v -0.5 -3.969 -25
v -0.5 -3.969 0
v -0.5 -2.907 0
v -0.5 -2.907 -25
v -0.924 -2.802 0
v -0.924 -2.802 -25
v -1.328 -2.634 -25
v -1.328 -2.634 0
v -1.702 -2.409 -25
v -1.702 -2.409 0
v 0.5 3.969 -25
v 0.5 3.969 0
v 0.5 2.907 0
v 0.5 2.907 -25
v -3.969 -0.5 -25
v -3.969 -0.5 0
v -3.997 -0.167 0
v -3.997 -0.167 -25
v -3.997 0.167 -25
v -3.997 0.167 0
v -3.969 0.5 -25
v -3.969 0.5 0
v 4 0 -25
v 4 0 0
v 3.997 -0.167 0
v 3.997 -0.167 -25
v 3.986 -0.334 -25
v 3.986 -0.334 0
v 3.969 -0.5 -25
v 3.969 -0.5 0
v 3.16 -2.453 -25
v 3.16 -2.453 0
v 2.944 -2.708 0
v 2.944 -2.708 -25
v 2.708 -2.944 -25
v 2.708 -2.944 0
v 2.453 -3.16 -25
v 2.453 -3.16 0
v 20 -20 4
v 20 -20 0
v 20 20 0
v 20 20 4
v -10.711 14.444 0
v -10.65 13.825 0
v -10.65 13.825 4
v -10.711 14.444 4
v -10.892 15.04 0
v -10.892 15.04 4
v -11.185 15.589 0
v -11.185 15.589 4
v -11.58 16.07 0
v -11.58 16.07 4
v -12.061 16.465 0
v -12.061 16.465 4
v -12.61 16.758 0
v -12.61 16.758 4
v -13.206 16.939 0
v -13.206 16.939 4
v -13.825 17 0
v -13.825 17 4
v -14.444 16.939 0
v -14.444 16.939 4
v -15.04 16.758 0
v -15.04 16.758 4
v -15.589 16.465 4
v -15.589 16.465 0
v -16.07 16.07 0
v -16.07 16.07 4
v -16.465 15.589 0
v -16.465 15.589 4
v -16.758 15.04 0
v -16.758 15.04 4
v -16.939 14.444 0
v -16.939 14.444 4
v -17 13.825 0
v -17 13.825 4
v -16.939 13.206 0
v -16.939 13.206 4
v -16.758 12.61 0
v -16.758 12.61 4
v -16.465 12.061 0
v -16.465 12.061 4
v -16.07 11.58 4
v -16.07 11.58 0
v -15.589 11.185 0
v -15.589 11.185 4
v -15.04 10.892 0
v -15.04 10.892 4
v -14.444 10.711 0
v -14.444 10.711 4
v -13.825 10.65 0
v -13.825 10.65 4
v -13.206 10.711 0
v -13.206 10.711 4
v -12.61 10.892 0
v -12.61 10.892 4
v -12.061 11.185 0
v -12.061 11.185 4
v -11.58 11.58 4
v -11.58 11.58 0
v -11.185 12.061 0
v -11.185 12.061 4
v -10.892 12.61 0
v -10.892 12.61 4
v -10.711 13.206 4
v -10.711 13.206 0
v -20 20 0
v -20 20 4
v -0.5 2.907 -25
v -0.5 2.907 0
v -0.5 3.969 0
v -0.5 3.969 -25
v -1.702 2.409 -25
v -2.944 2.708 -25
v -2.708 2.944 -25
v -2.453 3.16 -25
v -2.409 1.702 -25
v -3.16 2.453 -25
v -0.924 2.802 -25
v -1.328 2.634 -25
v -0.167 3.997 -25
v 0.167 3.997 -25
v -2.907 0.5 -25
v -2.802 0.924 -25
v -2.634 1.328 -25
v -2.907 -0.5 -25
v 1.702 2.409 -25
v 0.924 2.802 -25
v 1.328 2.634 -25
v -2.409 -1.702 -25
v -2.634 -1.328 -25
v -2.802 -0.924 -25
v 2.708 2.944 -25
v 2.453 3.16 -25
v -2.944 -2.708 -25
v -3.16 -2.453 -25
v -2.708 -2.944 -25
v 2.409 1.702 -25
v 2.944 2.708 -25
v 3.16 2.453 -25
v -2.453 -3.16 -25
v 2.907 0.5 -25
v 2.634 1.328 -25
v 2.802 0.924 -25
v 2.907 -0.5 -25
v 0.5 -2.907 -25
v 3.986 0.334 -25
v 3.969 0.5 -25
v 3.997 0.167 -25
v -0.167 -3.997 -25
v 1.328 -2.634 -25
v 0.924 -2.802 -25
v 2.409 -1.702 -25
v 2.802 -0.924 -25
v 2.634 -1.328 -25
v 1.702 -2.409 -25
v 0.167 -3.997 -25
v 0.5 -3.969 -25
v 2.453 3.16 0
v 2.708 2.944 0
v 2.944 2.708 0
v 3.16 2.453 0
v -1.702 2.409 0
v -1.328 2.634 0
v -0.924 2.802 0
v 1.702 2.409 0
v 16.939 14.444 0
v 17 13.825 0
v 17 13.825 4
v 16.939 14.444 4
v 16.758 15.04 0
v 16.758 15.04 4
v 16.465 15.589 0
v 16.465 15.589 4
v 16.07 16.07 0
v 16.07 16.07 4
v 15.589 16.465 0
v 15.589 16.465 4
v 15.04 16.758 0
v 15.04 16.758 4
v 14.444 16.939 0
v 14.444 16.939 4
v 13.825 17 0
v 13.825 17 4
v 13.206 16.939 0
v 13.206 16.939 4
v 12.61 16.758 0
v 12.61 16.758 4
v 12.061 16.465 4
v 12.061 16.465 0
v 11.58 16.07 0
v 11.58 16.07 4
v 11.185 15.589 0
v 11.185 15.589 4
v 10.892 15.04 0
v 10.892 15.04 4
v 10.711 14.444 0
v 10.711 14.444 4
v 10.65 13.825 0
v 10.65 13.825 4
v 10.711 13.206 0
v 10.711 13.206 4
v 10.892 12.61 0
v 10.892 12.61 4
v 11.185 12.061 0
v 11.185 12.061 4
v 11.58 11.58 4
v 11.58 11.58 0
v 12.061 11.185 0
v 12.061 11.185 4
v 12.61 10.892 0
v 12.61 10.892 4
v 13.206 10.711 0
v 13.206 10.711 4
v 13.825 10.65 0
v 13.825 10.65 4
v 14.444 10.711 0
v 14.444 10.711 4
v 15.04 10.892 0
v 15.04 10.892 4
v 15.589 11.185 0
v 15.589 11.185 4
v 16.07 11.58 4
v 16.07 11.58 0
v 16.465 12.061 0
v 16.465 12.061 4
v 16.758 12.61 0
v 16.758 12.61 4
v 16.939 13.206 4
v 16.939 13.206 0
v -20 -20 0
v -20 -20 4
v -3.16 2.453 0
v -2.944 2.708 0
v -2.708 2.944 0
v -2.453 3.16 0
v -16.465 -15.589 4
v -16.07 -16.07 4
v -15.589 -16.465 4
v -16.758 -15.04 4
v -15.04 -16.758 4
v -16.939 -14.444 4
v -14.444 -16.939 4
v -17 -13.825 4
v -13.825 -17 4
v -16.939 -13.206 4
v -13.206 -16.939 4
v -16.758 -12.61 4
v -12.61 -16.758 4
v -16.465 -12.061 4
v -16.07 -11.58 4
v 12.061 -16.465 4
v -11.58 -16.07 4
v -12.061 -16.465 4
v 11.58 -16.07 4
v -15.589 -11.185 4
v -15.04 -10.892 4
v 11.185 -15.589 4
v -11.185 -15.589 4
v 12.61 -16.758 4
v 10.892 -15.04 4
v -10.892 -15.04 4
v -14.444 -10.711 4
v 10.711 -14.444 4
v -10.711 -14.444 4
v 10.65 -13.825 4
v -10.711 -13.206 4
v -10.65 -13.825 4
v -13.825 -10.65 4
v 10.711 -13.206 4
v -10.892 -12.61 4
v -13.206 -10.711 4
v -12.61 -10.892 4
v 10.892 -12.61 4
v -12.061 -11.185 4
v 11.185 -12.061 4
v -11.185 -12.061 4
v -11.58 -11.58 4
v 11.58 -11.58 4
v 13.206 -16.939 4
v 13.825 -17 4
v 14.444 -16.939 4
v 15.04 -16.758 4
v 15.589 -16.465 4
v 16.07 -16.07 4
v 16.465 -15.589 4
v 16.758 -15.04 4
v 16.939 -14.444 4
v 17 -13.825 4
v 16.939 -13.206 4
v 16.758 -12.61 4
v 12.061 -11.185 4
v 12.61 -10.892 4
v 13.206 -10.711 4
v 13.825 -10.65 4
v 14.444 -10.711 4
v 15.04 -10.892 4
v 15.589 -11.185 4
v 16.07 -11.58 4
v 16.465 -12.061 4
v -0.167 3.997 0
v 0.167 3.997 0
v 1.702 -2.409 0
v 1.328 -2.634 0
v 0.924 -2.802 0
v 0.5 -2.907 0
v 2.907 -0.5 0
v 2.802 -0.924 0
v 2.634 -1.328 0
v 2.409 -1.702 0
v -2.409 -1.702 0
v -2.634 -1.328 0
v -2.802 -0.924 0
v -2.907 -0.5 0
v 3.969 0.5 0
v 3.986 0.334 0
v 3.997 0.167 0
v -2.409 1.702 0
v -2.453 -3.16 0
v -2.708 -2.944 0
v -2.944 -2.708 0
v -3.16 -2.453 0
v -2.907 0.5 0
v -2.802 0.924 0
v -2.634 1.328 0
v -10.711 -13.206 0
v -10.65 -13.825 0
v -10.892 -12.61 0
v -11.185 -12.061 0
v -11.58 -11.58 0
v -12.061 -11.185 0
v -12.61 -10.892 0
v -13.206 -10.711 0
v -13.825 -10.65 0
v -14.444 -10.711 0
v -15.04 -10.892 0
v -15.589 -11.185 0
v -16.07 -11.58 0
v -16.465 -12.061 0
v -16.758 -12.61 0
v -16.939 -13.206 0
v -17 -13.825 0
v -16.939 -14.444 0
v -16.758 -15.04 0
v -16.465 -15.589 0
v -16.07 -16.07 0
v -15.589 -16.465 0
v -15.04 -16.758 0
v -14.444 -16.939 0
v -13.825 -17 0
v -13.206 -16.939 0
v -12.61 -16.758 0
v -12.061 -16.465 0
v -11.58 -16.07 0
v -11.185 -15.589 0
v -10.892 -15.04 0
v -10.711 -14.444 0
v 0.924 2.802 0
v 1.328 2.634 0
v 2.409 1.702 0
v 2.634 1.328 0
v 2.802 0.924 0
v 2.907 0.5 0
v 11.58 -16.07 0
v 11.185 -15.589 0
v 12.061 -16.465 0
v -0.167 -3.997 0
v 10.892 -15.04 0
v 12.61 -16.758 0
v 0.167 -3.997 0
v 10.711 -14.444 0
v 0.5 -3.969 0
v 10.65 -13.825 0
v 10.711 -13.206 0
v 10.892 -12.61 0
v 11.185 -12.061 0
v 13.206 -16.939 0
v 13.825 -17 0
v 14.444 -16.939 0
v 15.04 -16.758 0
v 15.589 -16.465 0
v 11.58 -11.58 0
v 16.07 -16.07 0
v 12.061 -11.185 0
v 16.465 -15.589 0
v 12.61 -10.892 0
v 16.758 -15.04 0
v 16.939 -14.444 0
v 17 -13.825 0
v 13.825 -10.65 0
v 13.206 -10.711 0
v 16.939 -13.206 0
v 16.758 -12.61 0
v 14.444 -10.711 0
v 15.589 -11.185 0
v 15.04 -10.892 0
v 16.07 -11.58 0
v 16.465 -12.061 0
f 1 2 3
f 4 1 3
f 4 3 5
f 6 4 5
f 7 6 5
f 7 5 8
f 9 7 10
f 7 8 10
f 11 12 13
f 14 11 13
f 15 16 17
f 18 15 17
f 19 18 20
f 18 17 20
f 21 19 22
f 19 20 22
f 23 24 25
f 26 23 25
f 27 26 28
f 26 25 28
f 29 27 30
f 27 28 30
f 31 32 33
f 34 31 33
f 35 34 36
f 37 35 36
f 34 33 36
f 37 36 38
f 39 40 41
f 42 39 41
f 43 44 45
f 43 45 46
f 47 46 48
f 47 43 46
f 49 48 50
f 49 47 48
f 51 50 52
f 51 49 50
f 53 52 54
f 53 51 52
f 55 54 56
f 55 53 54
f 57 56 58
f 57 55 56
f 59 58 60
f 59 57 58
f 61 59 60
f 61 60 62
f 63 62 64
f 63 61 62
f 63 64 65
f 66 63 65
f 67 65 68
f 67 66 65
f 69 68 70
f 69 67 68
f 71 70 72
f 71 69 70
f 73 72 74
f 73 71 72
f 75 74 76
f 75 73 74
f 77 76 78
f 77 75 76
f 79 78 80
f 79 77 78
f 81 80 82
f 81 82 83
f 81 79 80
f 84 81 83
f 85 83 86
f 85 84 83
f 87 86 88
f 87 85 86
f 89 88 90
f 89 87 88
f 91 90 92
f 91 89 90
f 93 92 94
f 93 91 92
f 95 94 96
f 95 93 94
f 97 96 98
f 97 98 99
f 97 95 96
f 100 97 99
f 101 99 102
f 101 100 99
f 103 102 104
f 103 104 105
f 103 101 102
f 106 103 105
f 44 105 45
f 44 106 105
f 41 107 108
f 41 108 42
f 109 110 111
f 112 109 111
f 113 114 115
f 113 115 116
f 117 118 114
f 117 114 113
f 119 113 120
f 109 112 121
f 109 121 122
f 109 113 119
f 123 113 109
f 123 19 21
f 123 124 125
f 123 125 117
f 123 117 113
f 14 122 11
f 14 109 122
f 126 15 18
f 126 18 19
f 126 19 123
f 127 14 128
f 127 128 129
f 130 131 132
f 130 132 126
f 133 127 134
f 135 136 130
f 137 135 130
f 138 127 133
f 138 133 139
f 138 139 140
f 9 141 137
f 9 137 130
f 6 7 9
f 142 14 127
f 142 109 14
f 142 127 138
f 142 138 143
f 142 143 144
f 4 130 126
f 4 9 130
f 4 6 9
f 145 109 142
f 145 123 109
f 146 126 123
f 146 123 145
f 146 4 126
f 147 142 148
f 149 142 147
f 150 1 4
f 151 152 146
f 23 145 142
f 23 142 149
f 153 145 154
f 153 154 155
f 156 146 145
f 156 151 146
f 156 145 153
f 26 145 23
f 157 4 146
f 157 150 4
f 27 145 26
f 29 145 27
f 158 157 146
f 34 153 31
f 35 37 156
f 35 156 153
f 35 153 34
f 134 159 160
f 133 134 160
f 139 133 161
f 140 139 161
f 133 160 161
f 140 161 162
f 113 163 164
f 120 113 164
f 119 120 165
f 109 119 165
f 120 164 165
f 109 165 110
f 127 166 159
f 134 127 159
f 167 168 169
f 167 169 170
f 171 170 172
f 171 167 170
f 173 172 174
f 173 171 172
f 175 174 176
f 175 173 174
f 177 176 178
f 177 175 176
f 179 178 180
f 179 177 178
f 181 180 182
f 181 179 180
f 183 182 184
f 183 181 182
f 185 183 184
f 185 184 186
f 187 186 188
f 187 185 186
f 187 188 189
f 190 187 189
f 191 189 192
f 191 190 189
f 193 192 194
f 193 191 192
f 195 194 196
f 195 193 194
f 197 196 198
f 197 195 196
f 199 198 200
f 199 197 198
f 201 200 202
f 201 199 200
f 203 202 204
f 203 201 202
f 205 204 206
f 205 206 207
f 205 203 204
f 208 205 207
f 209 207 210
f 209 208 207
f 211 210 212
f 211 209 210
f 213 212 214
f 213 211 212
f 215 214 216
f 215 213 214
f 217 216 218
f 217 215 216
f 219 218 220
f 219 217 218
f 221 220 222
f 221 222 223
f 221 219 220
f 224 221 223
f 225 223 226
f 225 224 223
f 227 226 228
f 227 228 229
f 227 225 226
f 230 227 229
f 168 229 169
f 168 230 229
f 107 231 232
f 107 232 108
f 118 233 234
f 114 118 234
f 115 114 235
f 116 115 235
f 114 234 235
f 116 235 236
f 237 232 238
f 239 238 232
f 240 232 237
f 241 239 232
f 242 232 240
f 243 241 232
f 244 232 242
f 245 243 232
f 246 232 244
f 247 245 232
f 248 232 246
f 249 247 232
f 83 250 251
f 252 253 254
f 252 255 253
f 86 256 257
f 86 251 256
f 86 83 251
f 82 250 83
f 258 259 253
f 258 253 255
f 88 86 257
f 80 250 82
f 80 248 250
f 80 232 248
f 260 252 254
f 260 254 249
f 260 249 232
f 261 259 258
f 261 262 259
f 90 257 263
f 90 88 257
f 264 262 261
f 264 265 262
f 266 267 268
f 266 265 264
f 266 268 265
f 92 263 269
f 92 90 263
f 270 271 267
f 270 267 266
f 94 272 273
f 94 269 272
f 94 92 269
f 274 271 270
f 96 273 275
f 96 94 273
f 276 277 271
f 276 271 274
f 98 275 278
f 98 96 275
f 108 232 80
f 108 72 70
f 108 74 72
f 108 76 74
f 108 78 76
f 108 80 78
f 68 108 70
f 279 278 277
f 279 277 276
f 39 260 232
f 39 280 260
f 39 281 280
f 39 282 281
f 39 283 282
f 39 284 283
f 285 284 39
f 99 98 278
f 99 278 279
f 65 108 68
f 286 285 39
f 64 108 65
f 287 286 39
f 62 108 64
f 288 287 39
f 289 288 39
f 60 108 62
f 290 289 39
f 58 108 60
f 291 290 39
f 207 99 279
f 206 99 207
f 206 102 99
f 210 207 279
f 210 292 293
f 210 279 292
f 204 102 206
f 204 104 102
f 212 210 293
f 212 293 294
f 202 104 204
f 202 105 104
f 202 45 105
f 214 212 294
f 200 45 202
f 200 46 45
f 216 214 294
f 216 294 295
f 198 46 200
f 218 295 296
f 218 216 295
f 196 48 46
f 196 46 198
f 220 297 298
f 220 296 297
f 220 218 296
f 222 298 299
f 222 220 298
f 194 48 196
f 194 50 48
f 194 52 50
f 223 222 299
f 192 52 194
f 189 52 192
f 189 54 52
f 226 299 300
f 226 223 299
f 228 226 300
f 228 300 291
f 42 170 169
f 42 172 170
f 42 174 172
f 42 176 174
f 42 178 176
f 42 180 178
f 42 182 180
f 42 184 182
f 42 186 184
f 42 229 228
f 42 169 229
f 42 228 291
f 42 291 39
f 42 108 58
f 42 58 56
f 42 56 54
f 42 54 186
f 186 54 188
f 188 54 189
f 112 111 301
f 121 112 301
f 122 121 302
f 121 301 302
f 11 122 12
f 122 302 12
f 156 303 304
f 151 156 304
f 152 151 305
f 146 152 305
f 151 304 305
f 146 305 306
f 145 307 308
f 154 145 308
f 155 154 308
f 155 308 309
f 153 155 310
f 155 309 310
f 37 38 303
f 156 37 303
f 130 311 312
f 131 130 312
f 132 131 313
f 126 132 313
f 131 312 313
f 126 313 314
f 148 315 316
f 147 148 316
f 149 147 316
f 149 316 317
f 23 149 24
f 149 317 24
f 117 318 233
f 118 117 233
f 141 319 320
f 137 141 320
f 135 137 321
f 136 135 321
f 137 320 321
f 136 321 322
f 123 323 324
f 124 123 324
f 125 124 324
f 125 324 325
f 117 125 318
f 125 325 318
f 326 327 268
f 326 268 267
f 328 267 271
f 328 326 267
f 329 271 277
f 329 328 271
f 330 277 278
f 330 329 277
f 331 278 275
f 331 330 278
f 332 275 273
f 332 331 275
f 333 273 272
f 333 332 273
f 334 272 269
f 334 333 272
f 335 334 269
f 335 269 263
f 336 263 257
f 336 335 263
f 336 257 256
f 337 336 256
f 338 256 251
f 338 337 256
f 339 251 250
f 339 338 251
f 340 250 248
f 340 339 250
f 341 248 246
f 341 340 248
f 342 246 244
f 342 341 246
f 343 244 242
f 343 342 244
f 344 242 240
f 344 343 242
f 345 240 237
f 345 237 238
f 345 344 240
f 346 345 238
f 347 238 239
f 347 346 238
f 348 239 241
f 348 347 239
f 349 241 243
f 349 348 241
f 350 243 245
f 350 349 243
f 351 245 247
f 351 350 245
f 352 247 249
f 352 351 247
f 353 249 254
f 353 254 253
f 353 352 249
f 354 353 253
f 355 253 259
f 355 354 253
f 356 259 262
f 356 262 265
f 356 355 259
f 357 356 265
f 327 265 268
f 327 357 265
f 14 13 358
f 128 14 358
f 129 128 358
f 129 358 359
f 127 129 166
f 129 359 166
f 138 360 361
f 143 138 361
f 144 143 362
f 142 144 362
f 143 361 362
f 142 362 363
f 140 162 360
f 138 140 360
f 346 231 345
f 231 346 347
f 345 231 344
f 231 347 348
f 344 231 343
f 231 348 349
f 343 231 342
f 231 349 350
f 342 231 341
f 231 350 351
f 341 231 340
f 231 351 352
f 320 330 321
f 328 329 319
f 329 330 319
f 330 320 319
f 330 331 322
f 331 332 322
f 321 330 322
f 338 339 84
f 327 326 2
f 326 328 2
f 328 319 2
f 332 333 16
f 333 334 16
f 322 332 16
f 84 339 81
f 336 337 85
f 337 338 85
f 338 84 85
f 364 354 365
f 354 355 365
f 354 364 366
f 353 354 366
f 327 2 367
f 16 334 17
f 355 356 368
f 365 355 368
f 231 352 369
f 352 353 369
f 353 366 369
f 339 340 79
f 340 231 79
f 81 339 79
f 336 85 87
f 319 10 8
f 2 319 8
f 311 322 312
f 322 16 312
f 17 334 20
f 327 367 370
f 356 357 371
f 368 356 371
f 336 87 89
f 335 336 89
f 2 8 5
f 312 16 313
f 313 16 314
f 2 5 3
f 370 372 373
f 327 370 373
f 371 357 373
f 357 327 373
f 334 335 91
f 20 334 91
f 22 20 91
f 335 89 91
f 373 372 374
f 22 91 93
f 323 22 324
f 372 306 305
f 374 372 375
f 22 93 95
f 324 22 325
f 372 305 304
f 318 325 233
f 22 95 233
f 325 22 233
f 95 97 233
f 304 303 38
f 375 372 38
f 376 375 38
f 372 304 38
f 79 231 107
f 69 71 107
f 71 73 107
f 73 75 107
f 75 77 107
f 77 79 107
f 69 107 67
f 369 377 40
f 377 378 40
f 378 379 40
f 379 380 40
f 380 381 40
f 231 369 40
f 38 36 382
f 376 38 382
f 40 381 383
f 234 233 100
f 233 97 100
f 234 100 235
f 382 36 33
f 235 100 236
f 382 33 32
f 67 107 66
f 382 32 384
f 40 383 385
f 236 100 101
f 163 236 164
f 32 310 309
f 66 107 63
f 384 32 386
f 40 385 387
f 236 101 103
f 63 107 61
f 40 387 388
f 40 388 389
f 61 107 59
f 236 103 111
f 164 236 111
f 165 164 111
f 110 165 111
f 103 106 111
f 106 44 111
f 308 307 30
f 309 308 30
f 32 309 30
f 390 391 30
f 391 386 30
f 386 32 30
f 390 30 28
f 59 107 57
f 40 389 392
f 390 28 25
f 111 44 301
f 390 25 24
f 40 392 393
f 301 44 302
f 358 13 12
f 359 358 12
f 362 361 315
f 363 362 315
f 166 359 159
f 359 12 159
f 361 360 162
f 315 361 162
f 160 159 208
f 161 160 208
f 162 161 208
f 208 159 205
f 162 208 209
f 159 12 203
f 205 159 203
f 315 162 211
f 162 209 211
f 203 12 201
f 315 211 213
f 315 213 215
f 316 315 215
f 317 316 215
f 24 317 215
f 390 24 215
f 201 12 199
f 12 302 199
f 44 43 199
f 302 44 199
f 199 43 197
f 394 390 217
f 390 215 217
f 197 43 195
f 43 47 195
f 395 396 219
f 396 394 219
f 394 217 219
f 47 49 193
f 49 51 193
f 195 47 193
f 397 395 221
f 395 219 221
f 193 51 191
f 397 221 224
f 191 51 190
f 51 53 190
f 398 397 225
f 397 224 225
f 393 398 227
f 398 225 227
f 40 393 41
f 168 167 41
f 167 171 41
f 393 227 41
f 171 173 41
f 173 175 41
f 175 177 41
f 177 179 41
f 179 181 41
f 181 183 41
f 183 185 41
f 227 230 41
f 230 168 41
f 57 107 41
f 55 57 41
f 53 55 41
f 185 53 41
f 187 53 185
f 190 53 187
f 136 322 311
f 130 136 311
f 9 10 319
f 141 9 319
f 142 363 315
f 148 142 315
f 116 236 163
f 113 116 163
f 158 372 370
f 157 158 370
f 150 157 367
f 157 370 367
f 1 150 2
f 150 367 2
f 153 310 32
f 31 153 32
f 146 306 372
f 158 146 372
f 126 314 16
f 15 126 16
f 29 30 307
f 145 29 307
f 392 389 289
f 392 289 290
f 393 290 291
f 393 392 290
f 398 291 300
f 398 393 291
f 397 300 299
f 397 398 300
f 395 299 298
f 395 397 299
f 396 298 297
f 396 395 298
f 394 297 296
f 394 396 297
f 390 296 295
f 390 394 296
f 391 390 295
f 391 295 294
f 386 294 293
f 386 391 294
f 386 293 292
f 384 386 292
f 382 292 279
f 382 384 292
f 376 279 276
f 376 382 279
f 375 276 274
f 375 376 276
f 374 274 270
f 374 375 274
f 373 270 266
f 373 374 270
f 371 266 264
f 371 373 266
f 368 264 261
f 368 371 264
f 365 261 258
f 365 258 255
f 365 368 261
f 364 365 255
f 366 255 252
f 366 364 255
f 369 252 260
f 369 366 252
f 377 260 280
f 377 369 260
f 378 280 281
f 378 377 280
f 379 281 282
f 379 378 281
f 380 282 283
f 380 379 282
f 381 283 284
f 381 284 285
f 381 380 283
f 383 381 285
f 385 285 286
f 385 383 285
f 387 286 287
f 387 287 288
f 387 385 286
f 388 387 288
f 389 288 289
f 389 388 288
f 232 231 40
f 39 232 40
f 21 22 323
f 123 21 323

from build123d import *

# Parameters (mm, degrees)
F0_W     = 40
F0_H     = 40
F0_R     = 3.175
F1_DEPTH = 4
F3_DEPTH = 25


with BuildPart() as f1:
    # F0 (on Top) → F1 (new body)
    with BuildSketch(Plane.XY):
        Rectangle(F0_W, F0_H)
        with Locations((-13.825, -13.825)):
            Circle(F0_R, mode=Mode.SUBTRACT)
        with Locations((13.825, -13.825)):
            Circle(F0_R, mode=Mode.SUBTRACT)
        with Locations((-13.825, 13.825)):
            Circle(F0_R, mode=Mode.SUBTRACT)
        with Locations((13.825, 13.825)):
            Circle(F0_R, mode=Mode.SUBTRACT)
    extrude(amount=F1_DEPTH)

    # F2 (on face) → F3 (join)
    with BuildSketch(Plane(origin=(0, 0, 0), x_dir=(1, 0, 0), z_dir=(0, 0, -1))):
        with BuildLine():
            ThreePointArc((1.702231, 2.409338), (2.085965, 2.085965), (2.409338, 1.702231))
            Line((2.409338, 1.702231), (3.159796, 2.45269))
            ThreePointArc((3.159796, 2.45269), (2.828427, 2.828427), (2.45269, 3.159796))
            Line((2.45269, 3.159796), (1.702231, 2.409338))
        make_face()
        with BuildLine():
            ThreePointArc((-0.5, 2.907318), (0, 2.95), (0.5, 2.907318))
            Line((0.5, 2.907318), (0.5, 3.968627))
            ThreePointArc((0.5, 3.968627), (0, 4), (-0.5, 3.968627))
            Line((-0.5, 3.968627), (-0.5, 2.907318))
        make_face()
        with BuildLine():
            ThreePointArc((-2.409338, 1.702231), (-2.085965, 2.085965), (-1.702231, 2.409338))
            Line((-1.702231, 2.409338), (-2.45269, 3.159796))
            ThreePointArc((-2.45269, 3.159796), (-2.828427, 2.828427), (-3.159796, 2.45269))
            Line((-3.159796, 2.45269), (-2.409338, 1.702231))
        make_face()
        with BuildLine():
            ThreePointArc((-2.907318, -0.5), (-2.95, 0), (-2.907318, 0.5))
            Line((-2.907318, 0.5), (-3.968627, 0.5))
            ThreePointArc((-3.968627, 0.5), (-4, 0), (-3.968627, -0.5))
            Line((-3.968627, -0.5), (-2.907318, -0.5))
        make_face()
        with BuildLine():
            Line((-2.45269, -3.159796), (-1.702231, -2.409338))
            ThreePointArc((-1.702231, -2.409338), (-2.085965, -2.085965), (-2.409338, -1.702231))
            Line((-2.409338, -1.702231), (-3.159796, -2.45269))
            ThreePointArc((-3.159796, -2.45269), (-2.828427, -2.828427), (-2.45269, -3.159796))
        make_face()
        with BuildLine():
            Line((0.5, -3.968627), (0.5, -2.907318))
            ThreePointArc((0.5, -2.907318), (0, -2.95), (-0.5, -2.907318))
            Line((-0.5, -2.907318), (-0.5, -3.968627))
            ThreePointArc((-0.5, -3.968627), (0, -4), (0.5, -3.968627))
        make_face()
        with BuildLine():
            Line((3.159796, -2.45269), (2.409338, -1.702231))
            ThreePointArc((2.409338, -1.702231), (2.085965, -2.085965), (1.702231, -2.409338))
            Line((1.702231, -2.409338), (2.45269, -3.159796))
            ThreePointArc((2.45269, -3.159796), (2.828427, -2.828427), (3.159796, -2.45269))
        make_face()
        with BuildLine():
            ThreePointArc((2.907318, 0.5), (2.93931, 0.250909), (2.95, 0))
            ThreePointArc((2.95, 0), (2.93931, -0.250909), (2.907318, -0.5))
            Line((2.907318, -0.5), (3.968627, -0.5))
            ThreePointArc((3.968627, -0.5), (3.992149, -0.250492), (4, 0))
            ThreePointArc((4, 0), (3.992149, 0.250492), (3.968627, 0.5))
            Line((3.968627, 0.5), (2.907318, 0.5))
        make_face()
        with BuildLine():
            ThreePointArc((2.907318, -0.5), (2.93931, -0.250909), (2.95, 0))
            ThreePointArc((2.95, 0), (2.93931, 0.250909), (2.907318, 0.5))
            ThreePointArc((2.907318, 0.5), (2.725445, 1.128916), (2.409338, 1.702231))
            ThreePointArc((2.409338, 1.702231), (2.085965, 2.085965), (1.702231, 2.409338))
            ThreePointArc((1.702231, 2.409338), (1.128916, 2.725445), (0.5, 2.907318))
            ThreePointArc((0.5, 2.907318), (0, 2.95), (-0.5, 2.907318))
            ThreePointArc((-0.5, 2.907318), (-1.128916, 2.725445), (-1.702231, 2.409338))
            ThreePointArc((-1.702231, 2.409338), (-2.085965, 2.085965), (-2.409338, 1.702231))
            ThreePointArc((-2.409338, 1.702231), (-2.725445, 1.128916), (-2.907318, 0.5))
            ThreePointArc((-2.907318, 0.5), (-2.95, 0), (-2.907318, -0.5))
            ThreePointArc((-2.907318, -0.5), (-2.725445, -1.128916), (-2.409338, -1.702231))
            ThreePointArc((-2.409338, -1.702231), (-2.085965, -2.085965), (-1.702231, -2.409338))
            ThreePointArc((-1.702231, -2.409338), (-1.128916, -2.725445), (-0.5, -2.907318))
            ThreePointArc((-0.5, -2.907318), (0, -2.95), (0.5, -2.907318))
            ThreePointArc((0.5, -2.907318), (1.128916, -2.725445), (1.702231, -2.409338))
            ThreePointArc((1.702231, -2.409338), (2.085965, -2.085965), (2.409338, -1.702231))
            ThreePointArc((2.409338, -1.702231), (2.725445, -1.128916), (2.907318, -0.5))
        make_face()
    extrude(amount=F3_DEPTH)


solid = f1.part
